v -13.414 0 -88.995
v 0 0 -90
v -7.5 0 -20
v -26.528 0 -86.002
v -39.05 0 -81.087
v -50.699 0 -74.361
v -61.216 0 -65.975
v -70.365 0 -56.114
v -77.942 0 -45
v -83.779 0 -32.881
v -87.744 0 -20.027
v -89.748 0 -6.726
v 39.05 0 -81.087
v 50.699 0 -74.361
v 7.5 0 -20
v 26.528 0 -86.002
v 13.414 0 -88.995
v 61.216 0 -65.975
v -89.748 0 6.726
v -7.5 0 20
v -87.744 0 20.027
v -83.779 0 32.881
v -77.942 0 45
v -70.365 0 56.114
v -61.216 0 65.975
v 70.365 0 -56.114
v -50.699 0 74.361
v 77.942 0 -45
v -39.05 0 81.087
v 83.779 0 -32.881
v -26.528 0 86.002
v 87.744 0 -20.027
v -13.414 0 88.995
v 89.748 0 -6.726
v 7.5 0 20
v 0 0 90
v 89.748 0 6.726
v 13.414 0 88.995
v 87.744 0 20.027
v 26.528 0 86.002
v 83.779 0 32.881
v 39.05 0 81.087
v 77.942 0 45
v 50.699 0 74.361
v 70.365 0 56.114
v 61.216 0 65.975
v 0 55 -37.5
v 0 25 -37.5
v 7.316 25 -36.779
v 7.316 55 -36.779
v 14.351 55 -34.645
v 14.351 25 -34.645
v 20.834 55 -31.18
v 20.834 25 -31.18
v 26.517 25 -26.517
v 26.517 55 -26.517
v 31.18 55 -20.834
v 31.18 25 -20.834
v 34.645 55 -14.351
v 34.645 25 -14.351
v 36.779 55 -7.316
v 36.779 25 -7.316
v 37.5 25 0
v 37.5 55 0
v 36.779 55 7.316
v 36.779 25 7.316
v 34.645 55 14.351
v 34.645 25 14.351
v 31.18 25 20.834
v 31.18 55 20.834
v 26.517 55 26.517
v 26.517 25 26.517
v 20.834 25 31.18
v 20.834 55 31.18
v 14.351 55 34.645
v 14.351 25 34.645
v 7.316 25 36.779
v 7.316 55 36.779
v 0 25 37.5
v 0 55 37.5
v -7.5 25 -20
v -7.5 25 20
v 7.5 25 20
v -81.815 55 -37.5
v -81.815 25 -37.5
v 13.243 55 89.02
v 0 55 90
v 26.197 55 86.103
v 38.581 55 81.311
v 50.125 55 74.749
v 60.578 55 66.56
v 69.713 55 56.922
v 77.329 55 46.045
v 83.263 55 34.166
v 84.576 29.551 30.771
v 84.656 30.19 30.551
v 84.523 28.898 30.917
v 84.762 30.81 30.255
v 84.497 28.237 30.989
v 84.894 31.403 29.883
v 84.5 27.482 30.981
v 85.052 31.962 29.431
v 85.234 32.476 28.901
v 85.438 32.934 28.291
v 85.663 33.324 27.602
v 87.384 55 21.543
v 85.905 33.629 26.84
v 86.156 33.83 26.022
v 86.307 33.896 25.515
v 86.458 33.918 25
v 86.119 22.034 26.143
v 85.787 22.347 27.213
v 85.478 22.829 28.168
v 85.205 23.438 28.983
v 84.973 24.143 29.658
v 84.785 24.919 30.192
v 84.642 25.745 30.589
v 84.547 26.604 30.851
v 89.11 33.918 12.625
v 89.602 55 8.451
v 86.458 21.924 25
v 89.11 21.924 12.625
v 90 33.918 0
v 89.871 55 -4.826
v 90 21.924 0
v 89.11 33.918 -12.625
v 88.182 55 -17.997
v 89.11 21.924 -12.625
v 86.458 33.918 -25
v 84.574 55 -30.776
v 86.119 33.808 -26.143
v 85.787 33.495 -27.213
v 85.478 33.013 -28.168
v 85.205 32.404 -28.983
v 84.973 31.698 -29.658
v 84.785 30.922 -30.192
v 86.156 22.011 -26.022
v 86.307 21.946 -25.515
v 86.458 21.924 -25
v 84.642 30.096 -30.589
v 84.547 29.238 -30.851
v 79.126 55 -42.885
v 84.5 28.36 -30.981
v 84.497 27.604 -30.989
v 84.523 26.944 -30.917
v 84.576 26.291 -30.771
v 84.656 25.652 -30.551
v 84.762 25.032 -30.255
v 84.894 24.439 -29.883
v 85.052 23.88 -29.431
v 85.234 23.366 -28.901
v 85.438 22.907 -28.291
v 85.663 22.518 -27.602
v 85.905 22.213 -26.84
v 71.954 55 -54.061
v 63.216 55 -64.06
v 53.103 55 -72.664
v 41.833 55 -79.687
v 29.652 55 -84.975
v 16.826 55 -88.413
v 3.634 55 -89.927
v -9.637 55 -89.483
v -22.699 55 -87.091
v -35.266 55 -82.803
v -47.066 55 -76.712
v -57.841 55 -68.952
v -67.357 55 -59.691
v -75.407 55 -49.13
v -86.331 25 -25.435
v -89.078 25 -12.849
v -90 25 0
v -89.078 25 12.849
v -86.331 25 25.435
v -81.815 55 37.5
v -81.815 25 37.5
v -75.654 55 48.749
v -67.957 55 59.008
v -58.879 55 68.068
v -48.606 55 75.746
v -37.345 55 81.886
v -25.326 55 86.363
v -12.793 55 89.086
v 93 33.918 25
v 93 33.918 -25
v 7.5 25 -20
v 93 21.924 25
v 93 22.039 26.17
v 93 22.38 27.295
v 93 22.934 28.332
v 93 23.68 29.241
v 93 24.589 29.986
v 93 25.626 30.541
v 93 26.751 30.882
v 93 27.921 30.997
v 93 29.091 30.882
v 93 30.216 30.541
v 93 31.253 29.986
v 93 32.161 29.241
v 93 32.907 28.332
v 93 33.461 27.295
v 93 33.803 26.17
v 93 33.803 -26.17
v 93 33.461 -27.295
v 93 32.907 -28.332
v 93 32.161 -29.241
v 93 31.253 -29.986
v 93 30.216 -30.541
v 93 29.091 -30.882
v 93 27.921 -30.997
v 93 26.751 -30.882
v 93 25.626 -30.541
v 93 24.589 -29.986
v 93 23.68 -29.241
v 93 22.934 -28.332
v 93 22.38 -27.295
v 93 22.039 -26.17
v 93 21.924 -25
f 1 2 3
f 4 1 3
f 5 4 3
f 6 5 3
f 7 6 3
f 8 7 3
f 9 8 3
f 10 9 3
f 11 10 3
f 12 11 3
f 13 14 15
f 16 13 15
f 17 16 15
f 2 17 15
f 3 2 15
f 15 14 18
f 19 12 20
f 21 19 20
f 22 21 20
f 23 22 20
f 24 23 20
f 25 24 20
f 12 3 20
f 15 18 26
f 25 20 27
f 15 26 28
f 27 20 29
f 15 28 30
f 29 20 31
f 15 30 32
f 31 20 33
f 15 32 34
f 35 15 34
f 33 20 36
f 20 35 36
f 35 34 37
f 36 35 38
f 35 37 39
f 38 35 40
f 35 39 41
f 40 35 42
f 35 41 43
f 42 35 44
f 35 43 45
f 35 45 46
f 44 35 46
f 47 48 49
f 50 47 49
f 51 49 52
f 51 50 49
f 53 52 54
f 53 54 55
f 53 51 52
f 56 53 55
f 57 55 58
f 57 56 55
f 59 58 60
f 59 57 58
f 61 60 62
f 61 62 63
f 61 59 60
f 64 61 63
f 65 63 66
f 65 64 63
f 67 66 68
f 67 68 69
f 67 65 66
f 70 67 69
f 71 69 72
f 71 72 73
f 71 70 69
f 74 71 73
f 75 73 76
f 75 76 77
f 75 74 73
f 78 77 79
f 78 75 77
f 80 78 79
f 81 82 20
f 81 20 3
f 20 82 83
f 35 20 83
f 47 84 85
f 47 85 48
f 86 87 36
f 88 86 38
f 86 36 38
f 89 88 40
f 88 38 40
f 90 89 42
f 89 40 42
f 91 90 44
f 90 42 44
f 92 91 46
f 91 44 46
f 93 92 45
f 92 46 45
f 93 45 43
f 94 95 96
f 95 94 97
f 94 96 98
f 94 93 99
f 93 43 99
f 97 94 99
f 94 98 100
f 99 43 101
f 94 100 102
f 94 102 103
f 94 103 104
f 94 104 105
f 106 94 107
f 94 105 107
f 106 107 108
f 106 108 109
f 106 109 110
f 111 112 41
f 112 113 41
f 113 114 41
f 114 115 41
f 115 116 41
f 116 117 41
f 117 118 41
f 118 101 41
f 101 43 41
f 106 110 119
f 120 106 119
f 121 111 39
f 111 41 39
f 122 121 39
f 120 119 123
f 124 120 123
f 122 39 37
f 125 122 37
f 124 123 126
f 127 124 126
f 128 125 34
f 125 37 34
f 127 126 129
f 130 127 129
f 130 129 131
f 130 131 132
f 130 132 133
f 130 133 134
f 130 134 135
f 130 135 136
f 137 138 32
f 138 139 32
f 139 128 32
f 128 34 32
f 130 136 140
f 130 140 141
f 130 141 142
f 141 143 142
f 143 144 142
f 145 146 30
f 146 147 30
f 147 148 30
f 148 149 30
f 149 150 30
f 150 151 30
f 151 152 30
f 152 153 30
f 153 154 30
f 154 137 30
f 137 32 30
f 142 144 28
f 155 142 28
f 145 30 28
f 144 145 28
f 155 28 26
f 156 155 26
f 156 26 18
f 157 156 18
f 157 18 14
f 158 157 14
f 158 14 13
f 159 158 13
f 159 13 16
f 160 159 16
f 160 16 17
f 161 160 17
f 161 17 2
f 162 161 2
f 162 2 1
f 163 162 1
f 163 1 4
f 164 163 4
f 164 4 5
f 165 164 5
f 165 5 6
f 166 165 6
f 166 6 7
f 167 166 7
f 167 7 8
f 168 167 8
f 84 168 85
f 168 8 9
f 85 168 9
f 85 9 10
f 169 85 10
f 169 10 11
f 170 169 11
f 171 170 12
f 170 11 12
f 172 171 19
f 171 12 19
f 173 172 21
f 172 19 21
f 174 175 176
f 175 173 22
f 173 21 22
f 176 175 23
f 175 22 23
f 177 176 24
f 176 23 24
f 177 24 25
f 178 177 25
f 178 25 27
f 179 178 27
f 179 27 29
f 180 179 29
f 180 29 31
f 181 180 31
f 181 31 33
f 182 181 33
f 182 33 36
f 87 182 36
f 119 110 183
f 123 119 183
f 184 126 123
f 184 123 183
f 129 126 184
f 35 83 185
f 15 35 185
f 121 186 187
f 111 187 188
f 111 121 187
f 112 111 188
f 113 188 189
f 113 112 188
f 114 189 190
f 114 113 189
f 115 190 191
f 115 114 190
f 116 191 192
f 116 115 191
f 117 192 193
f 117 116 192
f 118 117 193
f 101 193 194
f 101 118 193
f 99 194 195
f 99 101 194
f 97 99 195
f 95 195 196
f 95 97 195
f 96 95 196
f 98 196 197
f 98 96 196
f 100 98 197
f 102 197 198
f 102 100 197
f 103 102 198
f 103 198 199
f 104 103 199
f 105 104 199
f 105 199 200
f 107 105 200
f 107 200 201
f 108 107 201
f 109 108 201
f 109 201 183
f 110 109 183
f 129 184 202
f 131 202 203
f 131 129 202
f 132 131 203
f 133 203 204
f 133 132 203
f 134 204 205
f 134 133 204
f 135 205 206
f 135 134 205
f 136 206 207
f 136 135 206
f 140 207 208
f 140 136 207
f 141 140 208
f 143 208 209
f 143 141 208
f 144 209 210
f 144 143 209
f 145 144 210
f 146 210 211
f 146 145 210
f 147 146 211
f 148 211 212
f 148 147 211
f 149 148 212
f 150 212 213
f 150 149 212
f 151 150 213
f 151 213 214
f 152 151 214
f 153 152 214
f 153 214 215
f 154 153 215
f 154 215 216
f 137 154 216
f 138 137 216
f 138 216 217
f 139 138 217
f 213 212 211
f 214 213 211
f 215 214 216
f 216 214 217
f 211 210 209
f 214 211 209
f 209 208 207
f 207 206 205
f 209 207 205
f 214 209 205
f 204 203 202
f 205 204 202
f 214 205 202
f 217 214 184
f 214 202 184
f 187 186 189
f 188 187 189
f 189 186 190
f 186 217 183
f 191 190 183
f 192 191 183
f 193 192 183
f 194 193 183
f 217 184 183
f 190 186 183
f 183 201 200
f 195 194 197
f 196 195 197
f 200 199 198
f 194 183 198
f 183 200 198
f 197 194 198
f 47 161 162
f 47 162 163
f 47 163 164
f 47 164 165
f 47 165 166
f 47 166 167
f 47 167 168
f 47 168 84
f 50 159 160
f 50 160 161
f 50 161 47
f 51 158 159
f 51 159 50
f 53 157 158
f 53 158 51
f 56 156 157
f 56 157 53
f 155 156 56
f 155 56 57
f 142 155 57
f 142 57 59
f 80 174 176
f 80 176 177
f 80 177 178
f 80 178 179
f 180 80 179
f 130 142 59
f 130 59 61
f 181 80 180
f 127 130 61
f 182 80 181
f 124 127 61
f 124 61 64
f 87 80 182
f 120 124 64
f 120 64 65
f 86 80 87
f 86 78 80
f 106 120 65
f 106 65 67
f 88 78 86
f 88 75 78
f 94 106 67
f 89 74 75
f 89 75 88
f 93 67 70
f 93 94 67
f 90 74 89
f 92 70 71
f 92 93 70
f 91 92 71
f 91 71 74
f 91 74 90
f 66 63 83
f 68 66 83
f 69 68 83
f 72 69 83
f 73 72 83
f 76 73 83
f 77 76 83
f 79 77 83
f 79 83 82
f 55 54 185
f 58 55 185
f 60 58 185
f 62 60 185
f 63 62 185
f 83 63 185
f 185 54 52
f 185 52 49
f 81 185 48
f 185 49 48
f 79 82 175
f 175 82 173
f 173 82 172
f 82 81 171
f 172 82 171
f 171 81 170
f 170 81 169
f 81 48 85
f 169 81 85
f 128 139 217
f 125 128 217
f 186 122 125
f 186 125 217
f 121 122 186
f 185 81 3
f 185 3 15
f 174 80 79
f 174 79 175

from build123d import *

# Parameters (mm, degrees)
SKETCH2_R           = 90
BOSS_EXTRUDE1_DEPTH = 55
CUT_EXTRUDE1_DEPTH  = 30
SKETCH4_W           = 15
SKETCH4_H           = 40
CUT_EXTRUDE2_DEPTH  = 131.766968306
BOSS_EXTRUDE2_DEPTH = 43


with BuildPart() as part:
    # Sketch2 → Boss-Extrude1 (new body)
    with BuildSketch(Plane(origin=(0, 0, 0), x_dir=(1, 0, 0), z_dir=(0, 1, 0))):
        Circle(SKETCH2_R)
    extrude(amount=BOSS_EXTRUDE1_DEPTH)

    # Sketch3 → Cut-Extrude1 (cut)
    with BuildSketch(Plane(origin=(0, 55, 0), x_dir=(1, 0, 0), z_dir=(0, 1, 0))):
        with BuildLine():
            Line((-144.325071801, 37.5), (0, 37.5))
            ThreePointArc((0, 37.5), (37.5, 0), (0, -37.5))
            Line((0, -37.5), (-144.325071801, -37.5))
            ThreePointArc((-144.325071801, -37.5), (-181.825071801, 0), (-144.325071801, 37.5))
        make_face()
    extrude(amount=-CUT_EXTRUDE1_DEPTH, mode=Mode.SUBTRACT)

    # Sketch4 → Cut-Extrude2 (cut, through all)
    with BuildSketch(Plane(origin=(0, 25, 0), x_dir=(1, 0, 0), z_dir=(0, 1, 0))):
        Rectangle(SKETCH4_W, SKETCH4_H)
    extrude(amount=-CUT_EXTRUDE2_DEPTH, mode=Mode.SUBTRACT)

    # Sketch6<4> → Boss-Extrude2 (add)
    with BuildSketch(Plane(origin=(50, 0, 0), x_dir=(0, 0, -1), z_dir=(1, 0, 0))):
        with BuildLine():
            Line((-25, 33.917885912), (25, 33.917885912))
            ThreePointArc((25, 33.917885912), (30.997040934, 27.920844978), (25, 21.923804044))
            Line((25, 21.923804044), (-25, 21.923804044))
            ThreePointArc((-25, 21.923804044), (-30.997040934, 27.920844978), (-25, 33.917885912))
        make_face()
    extrude(amount=BOSS_EXTRUDE2_DEPTH)


solid = part.part
